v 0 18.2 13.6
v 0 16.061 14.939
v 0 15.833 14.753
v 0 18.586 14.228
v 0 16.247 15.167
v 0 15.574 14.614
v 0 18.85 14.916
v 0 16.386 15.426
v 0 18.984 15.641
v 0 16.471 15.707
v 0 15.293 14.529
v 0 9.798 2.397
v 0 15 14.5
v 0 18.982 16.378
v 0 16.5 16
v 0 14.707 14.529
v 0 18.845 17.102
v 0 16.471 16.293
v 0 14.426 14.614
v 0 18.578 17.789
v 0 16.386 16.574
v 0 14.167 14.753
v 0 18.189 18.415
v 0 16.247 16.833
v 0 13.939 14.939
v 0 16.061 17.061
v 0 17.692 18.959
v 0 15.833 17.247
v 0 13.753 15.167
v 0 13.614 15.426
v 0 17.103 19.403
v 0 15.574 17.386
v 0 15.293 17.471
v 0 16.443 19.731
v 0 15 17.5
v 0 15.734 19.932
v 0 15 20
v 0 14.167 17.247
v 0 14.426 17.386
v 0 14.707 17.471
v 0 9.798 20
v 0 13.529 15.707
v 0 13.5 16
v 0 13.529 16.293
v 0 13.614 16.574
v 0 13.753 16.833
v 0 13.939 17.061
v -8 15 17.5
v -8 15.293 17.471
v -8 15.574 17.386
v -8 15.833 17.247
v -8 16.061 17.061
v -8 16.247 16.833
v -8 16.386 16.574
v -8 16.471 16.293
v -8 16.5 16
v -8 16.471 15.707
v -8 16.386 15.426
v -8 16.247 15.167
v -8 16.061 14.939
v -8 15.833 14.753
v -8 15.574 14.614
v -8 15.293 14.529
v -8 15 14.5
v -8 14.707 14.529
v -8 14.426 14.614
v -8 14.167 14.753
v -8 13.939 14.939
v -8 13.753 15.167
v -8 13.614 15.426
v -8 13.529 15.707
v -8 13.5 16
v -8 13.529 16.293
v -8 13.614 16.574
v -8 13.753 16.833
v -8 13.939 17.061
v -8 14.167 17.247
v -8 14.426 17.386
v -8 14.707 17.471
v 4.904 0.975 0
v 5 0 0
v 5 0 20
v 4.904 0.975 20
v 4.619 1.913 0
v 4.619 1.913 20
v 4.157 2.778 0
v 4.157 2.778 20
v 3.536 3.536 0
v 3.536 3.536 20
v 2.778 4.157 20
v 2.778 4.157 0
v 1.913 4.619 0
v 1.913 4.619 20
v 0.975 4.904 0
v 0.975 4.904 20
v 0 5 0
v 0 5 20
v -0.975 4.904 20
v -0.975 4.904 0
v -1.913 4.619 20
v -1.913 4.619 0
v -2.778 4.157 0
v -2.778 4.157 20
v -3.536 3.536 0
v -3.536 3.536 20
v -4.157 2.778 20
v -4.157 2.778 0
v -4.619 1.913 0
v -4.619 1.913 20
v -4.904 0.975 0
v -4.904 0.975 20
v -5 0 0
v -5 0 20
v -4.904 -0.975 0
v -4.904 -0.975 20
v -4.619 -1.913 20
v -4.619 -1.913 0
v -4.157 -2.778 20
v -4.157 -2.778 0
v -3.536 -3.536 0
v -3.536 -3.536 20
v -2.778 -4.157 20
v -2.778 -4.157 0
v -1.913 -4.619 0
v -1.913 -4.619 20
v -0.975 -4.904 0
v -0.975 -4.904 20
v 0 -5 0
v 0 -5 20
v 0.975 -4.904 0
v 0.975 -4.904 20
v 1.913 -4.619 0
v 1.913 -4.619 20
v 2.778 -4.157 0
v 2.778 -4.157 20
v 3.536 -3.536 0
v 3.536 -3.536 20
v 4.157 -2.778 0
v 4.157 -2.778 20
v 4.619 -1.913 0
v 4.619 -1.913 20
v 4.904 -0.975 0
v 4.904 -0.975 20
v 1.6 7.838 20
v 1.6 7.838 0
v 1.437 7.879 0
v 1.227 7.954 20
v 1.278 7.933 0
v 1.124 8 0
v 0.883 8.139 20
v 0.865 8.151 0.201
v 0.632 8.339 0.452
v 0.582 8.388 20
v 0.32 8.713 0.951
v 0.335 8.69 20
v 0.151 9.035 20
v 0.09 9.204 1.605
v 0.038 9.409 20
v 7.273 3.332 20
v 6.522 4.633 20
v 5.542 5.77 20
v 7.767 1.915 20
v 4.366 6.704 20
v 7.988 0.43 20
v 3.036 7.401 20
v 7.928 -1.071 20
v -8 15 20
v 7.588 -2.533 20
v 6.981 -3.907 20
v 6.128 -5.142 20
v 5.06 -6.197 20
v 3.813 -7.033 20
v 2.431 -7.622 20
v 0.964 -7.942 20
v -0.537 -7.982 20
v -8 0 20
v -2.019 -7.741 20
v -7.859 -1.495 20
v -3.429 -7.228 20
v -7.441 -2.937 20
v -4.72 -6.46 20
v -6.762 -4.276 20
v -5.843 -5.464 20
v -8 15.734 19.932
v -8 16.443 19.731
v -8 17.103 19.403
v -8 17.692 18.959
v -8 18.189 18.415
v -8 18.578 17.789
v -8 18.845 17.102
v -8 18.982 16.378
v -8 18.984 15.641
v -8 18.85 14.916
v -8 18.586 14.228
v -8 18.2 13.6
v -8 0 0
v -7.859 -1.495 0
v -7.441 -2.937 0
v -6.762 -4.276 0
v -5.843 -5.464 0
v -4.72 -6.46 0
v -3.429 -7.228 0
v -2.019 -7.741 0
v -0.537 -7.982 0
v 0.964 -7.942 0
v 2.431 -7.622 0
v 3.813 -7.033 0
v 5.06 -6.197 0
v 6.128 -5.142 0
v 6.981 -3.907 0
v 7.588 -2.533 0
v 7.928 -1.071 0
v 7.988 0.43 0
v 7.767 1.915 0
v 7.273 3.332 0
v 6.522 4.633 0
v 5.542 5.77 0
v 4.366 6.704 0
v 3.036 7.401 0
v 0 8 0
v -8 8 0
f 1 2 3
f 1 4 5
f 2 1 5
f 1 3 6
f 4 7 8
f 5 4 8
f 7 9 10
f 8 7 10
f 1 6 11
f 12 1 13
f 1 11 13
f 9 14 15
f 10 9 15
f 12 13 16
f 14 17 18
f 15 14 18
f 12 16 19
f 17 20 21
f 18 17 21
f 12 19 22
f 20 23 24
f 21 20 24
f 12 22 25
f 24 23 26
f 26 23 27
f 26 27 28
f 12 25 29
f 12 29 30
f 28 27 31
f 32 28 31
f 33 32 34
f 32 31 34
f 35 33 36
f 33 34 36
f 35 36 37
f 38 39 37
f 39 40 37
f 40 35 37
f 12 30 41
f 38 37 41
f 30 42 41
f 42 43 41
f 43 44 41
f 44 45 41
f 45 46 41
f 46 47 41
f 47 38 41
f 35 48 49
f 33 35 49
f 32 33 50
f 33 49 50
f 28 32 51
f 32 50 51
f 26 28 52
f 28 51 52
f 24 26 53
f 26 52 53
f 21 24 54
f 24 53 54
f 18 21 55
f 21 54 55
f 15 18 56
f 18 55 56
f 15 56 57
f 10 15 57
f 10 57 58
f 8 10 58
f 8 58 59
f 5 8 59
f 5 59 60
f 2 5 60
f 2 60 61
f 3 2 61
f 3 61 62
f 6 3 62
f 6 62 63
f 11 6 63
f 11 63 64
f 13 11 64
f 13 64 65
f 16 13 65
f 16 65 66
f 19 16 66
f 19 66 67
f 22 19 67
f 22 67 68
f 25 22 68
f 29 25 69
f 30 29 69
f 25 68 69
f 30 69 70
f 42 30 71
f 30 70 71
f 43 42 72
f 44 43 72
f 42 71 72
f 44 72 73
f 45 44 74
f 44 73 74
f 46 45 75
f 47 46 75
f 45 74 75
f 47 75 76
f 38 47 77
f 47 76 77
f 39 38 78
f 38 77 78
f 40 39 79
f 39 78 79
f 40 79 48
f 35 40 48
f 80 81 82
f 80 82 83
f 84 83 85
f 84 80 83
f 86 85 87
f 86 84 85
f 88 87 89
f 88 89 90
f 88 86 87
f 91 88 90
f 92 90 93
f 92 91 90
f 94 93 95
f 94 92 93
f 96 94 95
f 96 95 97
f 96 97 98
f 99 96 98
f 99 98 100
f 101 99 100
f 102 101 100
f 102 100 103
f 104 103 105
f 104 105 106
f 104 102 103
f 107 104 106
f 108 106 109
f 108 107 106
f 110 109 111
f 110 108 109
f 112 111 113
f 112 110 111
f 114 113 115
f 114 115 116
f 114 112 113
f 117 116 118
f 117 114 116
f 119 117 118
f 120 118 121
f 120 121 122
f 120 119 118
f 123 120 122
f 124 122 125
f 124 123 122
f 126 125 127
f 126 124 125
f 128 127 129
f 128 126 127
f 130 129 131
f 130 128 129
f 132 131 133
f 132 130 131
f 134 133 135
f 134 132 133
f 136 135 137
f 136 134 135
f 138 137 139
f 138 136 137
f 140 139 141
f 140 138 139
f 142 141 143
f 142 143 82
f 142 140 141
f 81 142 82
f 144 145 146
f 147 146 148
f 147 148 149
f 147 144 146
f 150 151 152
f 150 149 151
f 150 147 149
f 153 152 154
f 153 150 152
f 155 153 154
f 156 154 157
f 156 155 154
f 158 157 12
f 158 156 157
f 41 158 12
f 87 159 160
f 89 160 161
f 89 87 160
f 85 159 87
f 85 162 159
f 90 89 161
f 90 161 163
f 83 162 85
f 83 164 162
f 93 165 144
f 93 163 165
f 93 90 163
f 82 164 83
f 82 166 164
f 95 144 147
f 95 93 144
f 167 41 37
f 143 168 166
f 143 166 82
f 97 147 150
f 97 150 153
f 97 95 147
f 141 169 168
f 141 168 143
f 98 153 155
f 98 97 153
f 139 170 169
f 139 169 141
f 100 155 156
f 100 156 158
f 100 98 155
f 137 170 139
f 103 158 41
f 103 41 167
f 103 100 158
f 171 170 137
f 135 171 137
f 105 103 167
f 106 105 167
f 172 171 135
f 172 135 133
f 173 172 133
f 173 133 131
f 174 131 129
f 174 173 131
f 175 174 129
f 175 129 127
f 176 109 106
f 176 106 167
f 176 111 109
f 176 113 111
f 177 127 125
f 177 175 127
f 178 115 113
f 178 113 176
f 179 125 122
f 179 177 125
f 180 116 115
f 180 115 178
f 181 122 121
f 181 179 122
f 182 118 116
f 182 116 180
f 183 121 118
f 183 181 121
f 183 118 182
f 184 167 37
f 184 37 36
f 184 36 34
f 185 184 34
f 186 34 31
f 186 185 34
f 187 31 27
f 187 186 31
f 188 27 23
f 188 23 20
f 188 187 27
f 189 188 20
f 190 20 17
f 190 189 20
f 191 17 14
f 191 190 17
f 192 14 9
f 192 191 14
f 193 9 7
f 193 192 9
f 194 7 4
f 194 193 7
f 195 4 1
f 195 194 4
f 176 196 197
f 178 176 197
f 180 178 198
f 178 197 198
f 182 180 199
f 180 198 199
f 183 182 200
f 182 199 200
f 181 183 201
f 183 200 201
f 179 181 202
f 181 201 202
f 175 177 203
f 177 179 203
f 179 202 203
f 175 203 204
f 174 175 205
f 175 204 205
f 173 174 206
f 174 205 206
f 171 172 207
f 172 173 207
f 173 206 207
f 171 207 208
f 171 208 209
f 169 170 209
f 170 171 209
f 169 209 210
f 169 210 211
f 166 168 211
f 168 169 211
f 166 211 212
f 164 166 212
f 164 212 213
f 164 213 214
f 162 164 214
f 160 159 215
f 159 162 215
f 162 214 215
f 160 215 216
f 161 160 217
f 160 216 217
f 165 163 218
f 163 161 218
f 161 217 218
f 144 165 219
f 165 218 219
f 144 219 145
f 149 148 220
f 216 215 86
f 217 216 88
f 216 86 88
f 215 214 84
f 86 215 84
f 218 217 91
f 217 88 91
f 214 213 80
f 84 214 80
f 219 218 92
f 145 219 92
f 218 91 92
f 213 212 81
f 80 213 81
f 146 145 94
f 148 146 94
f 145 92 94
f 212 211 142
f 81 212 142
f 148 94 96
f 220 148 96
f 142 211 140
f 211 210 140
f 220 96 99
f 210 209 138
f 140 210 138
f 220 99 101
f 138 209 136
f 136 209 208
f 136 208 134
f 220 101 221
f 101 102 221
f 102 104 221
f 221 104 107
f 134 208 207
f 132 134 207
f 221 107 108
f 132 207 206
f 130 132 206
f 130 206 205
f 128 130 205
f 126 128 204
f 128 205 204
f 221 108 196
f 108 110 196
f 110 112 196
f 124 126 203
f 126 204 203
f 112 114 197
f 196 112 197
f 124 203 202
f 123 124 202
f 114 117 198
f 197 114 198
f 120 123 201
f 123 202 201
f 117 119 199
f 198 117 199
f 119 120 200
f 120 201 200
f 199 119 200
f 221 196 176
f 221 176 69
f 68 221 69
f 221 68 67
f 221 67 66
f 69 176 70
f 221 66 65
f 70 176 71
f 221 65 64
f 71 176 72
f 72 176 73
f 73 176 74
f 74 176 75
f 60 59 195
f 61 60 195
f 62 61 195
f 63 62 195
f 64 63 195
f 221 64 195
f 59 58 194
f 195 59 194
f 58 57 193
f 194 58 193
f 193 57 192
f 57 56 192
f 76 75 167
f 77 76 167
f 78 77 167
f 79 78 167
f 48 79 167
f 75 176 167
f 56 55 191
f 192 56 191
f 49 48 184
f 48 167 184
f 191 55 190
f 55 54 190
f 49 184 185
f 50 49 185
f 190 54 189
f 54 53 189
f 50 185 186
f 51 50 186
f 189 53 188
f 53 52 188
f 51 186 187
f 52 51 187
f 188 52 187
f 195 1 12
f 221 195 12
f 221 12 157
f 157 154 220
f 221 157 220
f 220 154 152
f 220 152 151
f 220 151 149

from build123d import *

# Parameters (mm, degrees)
SKETCH_1_R          = 8
SKETCH_1_R_2        = 5
EXTRUDE_1_DEPTH     = 20
EXTRUDE_2_DEPTH     = 20
SKETCH_3_R          = 1.5
CUT_EXTRUDE_1_DEPTH = 33.496153619
FILLET_1_R          = 2


with BuildPart() as part:
    # 草图1 → 凸台-拉伸1 (new body)
    with BuildSketch(Plane.XY):
        Circle(SKETCH_1_R)
        Circle(SKETCH_1_R_2, mode=Mode.SUBTRACT)
    extrude(amount=EXTRUDE_1_DEPTH)

    # 草图2 → 凸台-拉伸2 (add, through all)
    with BuildSketch(Plane.XY.offset(20)):
        with BuildLine():
            Line((-8, 0), (-8, 20))
            Line((-8, 20), (0, 20))
            Line((0, 20), (0, 8))
            ThreePointArc((0, 8), (-5.656854249, 5.656854249), (-8, 0))
        make_face()
    extrude(amount=-EXTRUDE_2_DEPTH)

    # 草图3 → 切除-拉伸1 (cut, through all)
    with BuildSketch(Plane.ZY.offset(8)):
        with Locations((16, 15)):
            Circle(SKETCH_3_R)
        with BuildLine():
            Line((13.6, 18.2), (0, 8))
            Line((0, 8), (0, 20))
            Line((0, 20), (20, 20))
            Line((20, 20), (20, 15))
            ThreePointArc((20, 15), (17.788854382, 18.577708764), (13.6, 18.2))
        make_face()
    extrude(amount=-CUT_EXTRUDE_1_DEPTH, mode=Mode.SUBTRACT)

    # 圆角1
    # the kernel refuses this fillet: 2 mm, written as the material it adds along each edge
    with BuildSketch(Plane(origin=(0, 8, 20), x_dir=(0.994936153005124, -0.10050896200520786, 0), z_dir=(0, 0, -1))) as fillet_1_piece_1_section:
        with BuildLine():
            CenterArc((1.809161316, -1.989872306), FILLET_1_R, 95.768479516, 78.463040967)
            Line((-0.18071099, -1.788854382), (0, 0))
            ThreePointArc((0, 0), (0.804071696, -0.040510776), (1.608143392, 0))
        make_face()
    fillet_1_piece_1 = extrude(amount=20, mode=Mode.PRIVATE)
    fillet_1_piece_1 = split(fillet_1_piece_1, bisect_by=Plane(origin=(0.363016692, 13.065708847, 6.754278462), z_dir=(0, -0.8000000000000002, 0.5999999999999999)), keep=Keep.TOP, mode=Mode.PRIVATE)
    add(fillet_1_piece_1)


solid = part.part
